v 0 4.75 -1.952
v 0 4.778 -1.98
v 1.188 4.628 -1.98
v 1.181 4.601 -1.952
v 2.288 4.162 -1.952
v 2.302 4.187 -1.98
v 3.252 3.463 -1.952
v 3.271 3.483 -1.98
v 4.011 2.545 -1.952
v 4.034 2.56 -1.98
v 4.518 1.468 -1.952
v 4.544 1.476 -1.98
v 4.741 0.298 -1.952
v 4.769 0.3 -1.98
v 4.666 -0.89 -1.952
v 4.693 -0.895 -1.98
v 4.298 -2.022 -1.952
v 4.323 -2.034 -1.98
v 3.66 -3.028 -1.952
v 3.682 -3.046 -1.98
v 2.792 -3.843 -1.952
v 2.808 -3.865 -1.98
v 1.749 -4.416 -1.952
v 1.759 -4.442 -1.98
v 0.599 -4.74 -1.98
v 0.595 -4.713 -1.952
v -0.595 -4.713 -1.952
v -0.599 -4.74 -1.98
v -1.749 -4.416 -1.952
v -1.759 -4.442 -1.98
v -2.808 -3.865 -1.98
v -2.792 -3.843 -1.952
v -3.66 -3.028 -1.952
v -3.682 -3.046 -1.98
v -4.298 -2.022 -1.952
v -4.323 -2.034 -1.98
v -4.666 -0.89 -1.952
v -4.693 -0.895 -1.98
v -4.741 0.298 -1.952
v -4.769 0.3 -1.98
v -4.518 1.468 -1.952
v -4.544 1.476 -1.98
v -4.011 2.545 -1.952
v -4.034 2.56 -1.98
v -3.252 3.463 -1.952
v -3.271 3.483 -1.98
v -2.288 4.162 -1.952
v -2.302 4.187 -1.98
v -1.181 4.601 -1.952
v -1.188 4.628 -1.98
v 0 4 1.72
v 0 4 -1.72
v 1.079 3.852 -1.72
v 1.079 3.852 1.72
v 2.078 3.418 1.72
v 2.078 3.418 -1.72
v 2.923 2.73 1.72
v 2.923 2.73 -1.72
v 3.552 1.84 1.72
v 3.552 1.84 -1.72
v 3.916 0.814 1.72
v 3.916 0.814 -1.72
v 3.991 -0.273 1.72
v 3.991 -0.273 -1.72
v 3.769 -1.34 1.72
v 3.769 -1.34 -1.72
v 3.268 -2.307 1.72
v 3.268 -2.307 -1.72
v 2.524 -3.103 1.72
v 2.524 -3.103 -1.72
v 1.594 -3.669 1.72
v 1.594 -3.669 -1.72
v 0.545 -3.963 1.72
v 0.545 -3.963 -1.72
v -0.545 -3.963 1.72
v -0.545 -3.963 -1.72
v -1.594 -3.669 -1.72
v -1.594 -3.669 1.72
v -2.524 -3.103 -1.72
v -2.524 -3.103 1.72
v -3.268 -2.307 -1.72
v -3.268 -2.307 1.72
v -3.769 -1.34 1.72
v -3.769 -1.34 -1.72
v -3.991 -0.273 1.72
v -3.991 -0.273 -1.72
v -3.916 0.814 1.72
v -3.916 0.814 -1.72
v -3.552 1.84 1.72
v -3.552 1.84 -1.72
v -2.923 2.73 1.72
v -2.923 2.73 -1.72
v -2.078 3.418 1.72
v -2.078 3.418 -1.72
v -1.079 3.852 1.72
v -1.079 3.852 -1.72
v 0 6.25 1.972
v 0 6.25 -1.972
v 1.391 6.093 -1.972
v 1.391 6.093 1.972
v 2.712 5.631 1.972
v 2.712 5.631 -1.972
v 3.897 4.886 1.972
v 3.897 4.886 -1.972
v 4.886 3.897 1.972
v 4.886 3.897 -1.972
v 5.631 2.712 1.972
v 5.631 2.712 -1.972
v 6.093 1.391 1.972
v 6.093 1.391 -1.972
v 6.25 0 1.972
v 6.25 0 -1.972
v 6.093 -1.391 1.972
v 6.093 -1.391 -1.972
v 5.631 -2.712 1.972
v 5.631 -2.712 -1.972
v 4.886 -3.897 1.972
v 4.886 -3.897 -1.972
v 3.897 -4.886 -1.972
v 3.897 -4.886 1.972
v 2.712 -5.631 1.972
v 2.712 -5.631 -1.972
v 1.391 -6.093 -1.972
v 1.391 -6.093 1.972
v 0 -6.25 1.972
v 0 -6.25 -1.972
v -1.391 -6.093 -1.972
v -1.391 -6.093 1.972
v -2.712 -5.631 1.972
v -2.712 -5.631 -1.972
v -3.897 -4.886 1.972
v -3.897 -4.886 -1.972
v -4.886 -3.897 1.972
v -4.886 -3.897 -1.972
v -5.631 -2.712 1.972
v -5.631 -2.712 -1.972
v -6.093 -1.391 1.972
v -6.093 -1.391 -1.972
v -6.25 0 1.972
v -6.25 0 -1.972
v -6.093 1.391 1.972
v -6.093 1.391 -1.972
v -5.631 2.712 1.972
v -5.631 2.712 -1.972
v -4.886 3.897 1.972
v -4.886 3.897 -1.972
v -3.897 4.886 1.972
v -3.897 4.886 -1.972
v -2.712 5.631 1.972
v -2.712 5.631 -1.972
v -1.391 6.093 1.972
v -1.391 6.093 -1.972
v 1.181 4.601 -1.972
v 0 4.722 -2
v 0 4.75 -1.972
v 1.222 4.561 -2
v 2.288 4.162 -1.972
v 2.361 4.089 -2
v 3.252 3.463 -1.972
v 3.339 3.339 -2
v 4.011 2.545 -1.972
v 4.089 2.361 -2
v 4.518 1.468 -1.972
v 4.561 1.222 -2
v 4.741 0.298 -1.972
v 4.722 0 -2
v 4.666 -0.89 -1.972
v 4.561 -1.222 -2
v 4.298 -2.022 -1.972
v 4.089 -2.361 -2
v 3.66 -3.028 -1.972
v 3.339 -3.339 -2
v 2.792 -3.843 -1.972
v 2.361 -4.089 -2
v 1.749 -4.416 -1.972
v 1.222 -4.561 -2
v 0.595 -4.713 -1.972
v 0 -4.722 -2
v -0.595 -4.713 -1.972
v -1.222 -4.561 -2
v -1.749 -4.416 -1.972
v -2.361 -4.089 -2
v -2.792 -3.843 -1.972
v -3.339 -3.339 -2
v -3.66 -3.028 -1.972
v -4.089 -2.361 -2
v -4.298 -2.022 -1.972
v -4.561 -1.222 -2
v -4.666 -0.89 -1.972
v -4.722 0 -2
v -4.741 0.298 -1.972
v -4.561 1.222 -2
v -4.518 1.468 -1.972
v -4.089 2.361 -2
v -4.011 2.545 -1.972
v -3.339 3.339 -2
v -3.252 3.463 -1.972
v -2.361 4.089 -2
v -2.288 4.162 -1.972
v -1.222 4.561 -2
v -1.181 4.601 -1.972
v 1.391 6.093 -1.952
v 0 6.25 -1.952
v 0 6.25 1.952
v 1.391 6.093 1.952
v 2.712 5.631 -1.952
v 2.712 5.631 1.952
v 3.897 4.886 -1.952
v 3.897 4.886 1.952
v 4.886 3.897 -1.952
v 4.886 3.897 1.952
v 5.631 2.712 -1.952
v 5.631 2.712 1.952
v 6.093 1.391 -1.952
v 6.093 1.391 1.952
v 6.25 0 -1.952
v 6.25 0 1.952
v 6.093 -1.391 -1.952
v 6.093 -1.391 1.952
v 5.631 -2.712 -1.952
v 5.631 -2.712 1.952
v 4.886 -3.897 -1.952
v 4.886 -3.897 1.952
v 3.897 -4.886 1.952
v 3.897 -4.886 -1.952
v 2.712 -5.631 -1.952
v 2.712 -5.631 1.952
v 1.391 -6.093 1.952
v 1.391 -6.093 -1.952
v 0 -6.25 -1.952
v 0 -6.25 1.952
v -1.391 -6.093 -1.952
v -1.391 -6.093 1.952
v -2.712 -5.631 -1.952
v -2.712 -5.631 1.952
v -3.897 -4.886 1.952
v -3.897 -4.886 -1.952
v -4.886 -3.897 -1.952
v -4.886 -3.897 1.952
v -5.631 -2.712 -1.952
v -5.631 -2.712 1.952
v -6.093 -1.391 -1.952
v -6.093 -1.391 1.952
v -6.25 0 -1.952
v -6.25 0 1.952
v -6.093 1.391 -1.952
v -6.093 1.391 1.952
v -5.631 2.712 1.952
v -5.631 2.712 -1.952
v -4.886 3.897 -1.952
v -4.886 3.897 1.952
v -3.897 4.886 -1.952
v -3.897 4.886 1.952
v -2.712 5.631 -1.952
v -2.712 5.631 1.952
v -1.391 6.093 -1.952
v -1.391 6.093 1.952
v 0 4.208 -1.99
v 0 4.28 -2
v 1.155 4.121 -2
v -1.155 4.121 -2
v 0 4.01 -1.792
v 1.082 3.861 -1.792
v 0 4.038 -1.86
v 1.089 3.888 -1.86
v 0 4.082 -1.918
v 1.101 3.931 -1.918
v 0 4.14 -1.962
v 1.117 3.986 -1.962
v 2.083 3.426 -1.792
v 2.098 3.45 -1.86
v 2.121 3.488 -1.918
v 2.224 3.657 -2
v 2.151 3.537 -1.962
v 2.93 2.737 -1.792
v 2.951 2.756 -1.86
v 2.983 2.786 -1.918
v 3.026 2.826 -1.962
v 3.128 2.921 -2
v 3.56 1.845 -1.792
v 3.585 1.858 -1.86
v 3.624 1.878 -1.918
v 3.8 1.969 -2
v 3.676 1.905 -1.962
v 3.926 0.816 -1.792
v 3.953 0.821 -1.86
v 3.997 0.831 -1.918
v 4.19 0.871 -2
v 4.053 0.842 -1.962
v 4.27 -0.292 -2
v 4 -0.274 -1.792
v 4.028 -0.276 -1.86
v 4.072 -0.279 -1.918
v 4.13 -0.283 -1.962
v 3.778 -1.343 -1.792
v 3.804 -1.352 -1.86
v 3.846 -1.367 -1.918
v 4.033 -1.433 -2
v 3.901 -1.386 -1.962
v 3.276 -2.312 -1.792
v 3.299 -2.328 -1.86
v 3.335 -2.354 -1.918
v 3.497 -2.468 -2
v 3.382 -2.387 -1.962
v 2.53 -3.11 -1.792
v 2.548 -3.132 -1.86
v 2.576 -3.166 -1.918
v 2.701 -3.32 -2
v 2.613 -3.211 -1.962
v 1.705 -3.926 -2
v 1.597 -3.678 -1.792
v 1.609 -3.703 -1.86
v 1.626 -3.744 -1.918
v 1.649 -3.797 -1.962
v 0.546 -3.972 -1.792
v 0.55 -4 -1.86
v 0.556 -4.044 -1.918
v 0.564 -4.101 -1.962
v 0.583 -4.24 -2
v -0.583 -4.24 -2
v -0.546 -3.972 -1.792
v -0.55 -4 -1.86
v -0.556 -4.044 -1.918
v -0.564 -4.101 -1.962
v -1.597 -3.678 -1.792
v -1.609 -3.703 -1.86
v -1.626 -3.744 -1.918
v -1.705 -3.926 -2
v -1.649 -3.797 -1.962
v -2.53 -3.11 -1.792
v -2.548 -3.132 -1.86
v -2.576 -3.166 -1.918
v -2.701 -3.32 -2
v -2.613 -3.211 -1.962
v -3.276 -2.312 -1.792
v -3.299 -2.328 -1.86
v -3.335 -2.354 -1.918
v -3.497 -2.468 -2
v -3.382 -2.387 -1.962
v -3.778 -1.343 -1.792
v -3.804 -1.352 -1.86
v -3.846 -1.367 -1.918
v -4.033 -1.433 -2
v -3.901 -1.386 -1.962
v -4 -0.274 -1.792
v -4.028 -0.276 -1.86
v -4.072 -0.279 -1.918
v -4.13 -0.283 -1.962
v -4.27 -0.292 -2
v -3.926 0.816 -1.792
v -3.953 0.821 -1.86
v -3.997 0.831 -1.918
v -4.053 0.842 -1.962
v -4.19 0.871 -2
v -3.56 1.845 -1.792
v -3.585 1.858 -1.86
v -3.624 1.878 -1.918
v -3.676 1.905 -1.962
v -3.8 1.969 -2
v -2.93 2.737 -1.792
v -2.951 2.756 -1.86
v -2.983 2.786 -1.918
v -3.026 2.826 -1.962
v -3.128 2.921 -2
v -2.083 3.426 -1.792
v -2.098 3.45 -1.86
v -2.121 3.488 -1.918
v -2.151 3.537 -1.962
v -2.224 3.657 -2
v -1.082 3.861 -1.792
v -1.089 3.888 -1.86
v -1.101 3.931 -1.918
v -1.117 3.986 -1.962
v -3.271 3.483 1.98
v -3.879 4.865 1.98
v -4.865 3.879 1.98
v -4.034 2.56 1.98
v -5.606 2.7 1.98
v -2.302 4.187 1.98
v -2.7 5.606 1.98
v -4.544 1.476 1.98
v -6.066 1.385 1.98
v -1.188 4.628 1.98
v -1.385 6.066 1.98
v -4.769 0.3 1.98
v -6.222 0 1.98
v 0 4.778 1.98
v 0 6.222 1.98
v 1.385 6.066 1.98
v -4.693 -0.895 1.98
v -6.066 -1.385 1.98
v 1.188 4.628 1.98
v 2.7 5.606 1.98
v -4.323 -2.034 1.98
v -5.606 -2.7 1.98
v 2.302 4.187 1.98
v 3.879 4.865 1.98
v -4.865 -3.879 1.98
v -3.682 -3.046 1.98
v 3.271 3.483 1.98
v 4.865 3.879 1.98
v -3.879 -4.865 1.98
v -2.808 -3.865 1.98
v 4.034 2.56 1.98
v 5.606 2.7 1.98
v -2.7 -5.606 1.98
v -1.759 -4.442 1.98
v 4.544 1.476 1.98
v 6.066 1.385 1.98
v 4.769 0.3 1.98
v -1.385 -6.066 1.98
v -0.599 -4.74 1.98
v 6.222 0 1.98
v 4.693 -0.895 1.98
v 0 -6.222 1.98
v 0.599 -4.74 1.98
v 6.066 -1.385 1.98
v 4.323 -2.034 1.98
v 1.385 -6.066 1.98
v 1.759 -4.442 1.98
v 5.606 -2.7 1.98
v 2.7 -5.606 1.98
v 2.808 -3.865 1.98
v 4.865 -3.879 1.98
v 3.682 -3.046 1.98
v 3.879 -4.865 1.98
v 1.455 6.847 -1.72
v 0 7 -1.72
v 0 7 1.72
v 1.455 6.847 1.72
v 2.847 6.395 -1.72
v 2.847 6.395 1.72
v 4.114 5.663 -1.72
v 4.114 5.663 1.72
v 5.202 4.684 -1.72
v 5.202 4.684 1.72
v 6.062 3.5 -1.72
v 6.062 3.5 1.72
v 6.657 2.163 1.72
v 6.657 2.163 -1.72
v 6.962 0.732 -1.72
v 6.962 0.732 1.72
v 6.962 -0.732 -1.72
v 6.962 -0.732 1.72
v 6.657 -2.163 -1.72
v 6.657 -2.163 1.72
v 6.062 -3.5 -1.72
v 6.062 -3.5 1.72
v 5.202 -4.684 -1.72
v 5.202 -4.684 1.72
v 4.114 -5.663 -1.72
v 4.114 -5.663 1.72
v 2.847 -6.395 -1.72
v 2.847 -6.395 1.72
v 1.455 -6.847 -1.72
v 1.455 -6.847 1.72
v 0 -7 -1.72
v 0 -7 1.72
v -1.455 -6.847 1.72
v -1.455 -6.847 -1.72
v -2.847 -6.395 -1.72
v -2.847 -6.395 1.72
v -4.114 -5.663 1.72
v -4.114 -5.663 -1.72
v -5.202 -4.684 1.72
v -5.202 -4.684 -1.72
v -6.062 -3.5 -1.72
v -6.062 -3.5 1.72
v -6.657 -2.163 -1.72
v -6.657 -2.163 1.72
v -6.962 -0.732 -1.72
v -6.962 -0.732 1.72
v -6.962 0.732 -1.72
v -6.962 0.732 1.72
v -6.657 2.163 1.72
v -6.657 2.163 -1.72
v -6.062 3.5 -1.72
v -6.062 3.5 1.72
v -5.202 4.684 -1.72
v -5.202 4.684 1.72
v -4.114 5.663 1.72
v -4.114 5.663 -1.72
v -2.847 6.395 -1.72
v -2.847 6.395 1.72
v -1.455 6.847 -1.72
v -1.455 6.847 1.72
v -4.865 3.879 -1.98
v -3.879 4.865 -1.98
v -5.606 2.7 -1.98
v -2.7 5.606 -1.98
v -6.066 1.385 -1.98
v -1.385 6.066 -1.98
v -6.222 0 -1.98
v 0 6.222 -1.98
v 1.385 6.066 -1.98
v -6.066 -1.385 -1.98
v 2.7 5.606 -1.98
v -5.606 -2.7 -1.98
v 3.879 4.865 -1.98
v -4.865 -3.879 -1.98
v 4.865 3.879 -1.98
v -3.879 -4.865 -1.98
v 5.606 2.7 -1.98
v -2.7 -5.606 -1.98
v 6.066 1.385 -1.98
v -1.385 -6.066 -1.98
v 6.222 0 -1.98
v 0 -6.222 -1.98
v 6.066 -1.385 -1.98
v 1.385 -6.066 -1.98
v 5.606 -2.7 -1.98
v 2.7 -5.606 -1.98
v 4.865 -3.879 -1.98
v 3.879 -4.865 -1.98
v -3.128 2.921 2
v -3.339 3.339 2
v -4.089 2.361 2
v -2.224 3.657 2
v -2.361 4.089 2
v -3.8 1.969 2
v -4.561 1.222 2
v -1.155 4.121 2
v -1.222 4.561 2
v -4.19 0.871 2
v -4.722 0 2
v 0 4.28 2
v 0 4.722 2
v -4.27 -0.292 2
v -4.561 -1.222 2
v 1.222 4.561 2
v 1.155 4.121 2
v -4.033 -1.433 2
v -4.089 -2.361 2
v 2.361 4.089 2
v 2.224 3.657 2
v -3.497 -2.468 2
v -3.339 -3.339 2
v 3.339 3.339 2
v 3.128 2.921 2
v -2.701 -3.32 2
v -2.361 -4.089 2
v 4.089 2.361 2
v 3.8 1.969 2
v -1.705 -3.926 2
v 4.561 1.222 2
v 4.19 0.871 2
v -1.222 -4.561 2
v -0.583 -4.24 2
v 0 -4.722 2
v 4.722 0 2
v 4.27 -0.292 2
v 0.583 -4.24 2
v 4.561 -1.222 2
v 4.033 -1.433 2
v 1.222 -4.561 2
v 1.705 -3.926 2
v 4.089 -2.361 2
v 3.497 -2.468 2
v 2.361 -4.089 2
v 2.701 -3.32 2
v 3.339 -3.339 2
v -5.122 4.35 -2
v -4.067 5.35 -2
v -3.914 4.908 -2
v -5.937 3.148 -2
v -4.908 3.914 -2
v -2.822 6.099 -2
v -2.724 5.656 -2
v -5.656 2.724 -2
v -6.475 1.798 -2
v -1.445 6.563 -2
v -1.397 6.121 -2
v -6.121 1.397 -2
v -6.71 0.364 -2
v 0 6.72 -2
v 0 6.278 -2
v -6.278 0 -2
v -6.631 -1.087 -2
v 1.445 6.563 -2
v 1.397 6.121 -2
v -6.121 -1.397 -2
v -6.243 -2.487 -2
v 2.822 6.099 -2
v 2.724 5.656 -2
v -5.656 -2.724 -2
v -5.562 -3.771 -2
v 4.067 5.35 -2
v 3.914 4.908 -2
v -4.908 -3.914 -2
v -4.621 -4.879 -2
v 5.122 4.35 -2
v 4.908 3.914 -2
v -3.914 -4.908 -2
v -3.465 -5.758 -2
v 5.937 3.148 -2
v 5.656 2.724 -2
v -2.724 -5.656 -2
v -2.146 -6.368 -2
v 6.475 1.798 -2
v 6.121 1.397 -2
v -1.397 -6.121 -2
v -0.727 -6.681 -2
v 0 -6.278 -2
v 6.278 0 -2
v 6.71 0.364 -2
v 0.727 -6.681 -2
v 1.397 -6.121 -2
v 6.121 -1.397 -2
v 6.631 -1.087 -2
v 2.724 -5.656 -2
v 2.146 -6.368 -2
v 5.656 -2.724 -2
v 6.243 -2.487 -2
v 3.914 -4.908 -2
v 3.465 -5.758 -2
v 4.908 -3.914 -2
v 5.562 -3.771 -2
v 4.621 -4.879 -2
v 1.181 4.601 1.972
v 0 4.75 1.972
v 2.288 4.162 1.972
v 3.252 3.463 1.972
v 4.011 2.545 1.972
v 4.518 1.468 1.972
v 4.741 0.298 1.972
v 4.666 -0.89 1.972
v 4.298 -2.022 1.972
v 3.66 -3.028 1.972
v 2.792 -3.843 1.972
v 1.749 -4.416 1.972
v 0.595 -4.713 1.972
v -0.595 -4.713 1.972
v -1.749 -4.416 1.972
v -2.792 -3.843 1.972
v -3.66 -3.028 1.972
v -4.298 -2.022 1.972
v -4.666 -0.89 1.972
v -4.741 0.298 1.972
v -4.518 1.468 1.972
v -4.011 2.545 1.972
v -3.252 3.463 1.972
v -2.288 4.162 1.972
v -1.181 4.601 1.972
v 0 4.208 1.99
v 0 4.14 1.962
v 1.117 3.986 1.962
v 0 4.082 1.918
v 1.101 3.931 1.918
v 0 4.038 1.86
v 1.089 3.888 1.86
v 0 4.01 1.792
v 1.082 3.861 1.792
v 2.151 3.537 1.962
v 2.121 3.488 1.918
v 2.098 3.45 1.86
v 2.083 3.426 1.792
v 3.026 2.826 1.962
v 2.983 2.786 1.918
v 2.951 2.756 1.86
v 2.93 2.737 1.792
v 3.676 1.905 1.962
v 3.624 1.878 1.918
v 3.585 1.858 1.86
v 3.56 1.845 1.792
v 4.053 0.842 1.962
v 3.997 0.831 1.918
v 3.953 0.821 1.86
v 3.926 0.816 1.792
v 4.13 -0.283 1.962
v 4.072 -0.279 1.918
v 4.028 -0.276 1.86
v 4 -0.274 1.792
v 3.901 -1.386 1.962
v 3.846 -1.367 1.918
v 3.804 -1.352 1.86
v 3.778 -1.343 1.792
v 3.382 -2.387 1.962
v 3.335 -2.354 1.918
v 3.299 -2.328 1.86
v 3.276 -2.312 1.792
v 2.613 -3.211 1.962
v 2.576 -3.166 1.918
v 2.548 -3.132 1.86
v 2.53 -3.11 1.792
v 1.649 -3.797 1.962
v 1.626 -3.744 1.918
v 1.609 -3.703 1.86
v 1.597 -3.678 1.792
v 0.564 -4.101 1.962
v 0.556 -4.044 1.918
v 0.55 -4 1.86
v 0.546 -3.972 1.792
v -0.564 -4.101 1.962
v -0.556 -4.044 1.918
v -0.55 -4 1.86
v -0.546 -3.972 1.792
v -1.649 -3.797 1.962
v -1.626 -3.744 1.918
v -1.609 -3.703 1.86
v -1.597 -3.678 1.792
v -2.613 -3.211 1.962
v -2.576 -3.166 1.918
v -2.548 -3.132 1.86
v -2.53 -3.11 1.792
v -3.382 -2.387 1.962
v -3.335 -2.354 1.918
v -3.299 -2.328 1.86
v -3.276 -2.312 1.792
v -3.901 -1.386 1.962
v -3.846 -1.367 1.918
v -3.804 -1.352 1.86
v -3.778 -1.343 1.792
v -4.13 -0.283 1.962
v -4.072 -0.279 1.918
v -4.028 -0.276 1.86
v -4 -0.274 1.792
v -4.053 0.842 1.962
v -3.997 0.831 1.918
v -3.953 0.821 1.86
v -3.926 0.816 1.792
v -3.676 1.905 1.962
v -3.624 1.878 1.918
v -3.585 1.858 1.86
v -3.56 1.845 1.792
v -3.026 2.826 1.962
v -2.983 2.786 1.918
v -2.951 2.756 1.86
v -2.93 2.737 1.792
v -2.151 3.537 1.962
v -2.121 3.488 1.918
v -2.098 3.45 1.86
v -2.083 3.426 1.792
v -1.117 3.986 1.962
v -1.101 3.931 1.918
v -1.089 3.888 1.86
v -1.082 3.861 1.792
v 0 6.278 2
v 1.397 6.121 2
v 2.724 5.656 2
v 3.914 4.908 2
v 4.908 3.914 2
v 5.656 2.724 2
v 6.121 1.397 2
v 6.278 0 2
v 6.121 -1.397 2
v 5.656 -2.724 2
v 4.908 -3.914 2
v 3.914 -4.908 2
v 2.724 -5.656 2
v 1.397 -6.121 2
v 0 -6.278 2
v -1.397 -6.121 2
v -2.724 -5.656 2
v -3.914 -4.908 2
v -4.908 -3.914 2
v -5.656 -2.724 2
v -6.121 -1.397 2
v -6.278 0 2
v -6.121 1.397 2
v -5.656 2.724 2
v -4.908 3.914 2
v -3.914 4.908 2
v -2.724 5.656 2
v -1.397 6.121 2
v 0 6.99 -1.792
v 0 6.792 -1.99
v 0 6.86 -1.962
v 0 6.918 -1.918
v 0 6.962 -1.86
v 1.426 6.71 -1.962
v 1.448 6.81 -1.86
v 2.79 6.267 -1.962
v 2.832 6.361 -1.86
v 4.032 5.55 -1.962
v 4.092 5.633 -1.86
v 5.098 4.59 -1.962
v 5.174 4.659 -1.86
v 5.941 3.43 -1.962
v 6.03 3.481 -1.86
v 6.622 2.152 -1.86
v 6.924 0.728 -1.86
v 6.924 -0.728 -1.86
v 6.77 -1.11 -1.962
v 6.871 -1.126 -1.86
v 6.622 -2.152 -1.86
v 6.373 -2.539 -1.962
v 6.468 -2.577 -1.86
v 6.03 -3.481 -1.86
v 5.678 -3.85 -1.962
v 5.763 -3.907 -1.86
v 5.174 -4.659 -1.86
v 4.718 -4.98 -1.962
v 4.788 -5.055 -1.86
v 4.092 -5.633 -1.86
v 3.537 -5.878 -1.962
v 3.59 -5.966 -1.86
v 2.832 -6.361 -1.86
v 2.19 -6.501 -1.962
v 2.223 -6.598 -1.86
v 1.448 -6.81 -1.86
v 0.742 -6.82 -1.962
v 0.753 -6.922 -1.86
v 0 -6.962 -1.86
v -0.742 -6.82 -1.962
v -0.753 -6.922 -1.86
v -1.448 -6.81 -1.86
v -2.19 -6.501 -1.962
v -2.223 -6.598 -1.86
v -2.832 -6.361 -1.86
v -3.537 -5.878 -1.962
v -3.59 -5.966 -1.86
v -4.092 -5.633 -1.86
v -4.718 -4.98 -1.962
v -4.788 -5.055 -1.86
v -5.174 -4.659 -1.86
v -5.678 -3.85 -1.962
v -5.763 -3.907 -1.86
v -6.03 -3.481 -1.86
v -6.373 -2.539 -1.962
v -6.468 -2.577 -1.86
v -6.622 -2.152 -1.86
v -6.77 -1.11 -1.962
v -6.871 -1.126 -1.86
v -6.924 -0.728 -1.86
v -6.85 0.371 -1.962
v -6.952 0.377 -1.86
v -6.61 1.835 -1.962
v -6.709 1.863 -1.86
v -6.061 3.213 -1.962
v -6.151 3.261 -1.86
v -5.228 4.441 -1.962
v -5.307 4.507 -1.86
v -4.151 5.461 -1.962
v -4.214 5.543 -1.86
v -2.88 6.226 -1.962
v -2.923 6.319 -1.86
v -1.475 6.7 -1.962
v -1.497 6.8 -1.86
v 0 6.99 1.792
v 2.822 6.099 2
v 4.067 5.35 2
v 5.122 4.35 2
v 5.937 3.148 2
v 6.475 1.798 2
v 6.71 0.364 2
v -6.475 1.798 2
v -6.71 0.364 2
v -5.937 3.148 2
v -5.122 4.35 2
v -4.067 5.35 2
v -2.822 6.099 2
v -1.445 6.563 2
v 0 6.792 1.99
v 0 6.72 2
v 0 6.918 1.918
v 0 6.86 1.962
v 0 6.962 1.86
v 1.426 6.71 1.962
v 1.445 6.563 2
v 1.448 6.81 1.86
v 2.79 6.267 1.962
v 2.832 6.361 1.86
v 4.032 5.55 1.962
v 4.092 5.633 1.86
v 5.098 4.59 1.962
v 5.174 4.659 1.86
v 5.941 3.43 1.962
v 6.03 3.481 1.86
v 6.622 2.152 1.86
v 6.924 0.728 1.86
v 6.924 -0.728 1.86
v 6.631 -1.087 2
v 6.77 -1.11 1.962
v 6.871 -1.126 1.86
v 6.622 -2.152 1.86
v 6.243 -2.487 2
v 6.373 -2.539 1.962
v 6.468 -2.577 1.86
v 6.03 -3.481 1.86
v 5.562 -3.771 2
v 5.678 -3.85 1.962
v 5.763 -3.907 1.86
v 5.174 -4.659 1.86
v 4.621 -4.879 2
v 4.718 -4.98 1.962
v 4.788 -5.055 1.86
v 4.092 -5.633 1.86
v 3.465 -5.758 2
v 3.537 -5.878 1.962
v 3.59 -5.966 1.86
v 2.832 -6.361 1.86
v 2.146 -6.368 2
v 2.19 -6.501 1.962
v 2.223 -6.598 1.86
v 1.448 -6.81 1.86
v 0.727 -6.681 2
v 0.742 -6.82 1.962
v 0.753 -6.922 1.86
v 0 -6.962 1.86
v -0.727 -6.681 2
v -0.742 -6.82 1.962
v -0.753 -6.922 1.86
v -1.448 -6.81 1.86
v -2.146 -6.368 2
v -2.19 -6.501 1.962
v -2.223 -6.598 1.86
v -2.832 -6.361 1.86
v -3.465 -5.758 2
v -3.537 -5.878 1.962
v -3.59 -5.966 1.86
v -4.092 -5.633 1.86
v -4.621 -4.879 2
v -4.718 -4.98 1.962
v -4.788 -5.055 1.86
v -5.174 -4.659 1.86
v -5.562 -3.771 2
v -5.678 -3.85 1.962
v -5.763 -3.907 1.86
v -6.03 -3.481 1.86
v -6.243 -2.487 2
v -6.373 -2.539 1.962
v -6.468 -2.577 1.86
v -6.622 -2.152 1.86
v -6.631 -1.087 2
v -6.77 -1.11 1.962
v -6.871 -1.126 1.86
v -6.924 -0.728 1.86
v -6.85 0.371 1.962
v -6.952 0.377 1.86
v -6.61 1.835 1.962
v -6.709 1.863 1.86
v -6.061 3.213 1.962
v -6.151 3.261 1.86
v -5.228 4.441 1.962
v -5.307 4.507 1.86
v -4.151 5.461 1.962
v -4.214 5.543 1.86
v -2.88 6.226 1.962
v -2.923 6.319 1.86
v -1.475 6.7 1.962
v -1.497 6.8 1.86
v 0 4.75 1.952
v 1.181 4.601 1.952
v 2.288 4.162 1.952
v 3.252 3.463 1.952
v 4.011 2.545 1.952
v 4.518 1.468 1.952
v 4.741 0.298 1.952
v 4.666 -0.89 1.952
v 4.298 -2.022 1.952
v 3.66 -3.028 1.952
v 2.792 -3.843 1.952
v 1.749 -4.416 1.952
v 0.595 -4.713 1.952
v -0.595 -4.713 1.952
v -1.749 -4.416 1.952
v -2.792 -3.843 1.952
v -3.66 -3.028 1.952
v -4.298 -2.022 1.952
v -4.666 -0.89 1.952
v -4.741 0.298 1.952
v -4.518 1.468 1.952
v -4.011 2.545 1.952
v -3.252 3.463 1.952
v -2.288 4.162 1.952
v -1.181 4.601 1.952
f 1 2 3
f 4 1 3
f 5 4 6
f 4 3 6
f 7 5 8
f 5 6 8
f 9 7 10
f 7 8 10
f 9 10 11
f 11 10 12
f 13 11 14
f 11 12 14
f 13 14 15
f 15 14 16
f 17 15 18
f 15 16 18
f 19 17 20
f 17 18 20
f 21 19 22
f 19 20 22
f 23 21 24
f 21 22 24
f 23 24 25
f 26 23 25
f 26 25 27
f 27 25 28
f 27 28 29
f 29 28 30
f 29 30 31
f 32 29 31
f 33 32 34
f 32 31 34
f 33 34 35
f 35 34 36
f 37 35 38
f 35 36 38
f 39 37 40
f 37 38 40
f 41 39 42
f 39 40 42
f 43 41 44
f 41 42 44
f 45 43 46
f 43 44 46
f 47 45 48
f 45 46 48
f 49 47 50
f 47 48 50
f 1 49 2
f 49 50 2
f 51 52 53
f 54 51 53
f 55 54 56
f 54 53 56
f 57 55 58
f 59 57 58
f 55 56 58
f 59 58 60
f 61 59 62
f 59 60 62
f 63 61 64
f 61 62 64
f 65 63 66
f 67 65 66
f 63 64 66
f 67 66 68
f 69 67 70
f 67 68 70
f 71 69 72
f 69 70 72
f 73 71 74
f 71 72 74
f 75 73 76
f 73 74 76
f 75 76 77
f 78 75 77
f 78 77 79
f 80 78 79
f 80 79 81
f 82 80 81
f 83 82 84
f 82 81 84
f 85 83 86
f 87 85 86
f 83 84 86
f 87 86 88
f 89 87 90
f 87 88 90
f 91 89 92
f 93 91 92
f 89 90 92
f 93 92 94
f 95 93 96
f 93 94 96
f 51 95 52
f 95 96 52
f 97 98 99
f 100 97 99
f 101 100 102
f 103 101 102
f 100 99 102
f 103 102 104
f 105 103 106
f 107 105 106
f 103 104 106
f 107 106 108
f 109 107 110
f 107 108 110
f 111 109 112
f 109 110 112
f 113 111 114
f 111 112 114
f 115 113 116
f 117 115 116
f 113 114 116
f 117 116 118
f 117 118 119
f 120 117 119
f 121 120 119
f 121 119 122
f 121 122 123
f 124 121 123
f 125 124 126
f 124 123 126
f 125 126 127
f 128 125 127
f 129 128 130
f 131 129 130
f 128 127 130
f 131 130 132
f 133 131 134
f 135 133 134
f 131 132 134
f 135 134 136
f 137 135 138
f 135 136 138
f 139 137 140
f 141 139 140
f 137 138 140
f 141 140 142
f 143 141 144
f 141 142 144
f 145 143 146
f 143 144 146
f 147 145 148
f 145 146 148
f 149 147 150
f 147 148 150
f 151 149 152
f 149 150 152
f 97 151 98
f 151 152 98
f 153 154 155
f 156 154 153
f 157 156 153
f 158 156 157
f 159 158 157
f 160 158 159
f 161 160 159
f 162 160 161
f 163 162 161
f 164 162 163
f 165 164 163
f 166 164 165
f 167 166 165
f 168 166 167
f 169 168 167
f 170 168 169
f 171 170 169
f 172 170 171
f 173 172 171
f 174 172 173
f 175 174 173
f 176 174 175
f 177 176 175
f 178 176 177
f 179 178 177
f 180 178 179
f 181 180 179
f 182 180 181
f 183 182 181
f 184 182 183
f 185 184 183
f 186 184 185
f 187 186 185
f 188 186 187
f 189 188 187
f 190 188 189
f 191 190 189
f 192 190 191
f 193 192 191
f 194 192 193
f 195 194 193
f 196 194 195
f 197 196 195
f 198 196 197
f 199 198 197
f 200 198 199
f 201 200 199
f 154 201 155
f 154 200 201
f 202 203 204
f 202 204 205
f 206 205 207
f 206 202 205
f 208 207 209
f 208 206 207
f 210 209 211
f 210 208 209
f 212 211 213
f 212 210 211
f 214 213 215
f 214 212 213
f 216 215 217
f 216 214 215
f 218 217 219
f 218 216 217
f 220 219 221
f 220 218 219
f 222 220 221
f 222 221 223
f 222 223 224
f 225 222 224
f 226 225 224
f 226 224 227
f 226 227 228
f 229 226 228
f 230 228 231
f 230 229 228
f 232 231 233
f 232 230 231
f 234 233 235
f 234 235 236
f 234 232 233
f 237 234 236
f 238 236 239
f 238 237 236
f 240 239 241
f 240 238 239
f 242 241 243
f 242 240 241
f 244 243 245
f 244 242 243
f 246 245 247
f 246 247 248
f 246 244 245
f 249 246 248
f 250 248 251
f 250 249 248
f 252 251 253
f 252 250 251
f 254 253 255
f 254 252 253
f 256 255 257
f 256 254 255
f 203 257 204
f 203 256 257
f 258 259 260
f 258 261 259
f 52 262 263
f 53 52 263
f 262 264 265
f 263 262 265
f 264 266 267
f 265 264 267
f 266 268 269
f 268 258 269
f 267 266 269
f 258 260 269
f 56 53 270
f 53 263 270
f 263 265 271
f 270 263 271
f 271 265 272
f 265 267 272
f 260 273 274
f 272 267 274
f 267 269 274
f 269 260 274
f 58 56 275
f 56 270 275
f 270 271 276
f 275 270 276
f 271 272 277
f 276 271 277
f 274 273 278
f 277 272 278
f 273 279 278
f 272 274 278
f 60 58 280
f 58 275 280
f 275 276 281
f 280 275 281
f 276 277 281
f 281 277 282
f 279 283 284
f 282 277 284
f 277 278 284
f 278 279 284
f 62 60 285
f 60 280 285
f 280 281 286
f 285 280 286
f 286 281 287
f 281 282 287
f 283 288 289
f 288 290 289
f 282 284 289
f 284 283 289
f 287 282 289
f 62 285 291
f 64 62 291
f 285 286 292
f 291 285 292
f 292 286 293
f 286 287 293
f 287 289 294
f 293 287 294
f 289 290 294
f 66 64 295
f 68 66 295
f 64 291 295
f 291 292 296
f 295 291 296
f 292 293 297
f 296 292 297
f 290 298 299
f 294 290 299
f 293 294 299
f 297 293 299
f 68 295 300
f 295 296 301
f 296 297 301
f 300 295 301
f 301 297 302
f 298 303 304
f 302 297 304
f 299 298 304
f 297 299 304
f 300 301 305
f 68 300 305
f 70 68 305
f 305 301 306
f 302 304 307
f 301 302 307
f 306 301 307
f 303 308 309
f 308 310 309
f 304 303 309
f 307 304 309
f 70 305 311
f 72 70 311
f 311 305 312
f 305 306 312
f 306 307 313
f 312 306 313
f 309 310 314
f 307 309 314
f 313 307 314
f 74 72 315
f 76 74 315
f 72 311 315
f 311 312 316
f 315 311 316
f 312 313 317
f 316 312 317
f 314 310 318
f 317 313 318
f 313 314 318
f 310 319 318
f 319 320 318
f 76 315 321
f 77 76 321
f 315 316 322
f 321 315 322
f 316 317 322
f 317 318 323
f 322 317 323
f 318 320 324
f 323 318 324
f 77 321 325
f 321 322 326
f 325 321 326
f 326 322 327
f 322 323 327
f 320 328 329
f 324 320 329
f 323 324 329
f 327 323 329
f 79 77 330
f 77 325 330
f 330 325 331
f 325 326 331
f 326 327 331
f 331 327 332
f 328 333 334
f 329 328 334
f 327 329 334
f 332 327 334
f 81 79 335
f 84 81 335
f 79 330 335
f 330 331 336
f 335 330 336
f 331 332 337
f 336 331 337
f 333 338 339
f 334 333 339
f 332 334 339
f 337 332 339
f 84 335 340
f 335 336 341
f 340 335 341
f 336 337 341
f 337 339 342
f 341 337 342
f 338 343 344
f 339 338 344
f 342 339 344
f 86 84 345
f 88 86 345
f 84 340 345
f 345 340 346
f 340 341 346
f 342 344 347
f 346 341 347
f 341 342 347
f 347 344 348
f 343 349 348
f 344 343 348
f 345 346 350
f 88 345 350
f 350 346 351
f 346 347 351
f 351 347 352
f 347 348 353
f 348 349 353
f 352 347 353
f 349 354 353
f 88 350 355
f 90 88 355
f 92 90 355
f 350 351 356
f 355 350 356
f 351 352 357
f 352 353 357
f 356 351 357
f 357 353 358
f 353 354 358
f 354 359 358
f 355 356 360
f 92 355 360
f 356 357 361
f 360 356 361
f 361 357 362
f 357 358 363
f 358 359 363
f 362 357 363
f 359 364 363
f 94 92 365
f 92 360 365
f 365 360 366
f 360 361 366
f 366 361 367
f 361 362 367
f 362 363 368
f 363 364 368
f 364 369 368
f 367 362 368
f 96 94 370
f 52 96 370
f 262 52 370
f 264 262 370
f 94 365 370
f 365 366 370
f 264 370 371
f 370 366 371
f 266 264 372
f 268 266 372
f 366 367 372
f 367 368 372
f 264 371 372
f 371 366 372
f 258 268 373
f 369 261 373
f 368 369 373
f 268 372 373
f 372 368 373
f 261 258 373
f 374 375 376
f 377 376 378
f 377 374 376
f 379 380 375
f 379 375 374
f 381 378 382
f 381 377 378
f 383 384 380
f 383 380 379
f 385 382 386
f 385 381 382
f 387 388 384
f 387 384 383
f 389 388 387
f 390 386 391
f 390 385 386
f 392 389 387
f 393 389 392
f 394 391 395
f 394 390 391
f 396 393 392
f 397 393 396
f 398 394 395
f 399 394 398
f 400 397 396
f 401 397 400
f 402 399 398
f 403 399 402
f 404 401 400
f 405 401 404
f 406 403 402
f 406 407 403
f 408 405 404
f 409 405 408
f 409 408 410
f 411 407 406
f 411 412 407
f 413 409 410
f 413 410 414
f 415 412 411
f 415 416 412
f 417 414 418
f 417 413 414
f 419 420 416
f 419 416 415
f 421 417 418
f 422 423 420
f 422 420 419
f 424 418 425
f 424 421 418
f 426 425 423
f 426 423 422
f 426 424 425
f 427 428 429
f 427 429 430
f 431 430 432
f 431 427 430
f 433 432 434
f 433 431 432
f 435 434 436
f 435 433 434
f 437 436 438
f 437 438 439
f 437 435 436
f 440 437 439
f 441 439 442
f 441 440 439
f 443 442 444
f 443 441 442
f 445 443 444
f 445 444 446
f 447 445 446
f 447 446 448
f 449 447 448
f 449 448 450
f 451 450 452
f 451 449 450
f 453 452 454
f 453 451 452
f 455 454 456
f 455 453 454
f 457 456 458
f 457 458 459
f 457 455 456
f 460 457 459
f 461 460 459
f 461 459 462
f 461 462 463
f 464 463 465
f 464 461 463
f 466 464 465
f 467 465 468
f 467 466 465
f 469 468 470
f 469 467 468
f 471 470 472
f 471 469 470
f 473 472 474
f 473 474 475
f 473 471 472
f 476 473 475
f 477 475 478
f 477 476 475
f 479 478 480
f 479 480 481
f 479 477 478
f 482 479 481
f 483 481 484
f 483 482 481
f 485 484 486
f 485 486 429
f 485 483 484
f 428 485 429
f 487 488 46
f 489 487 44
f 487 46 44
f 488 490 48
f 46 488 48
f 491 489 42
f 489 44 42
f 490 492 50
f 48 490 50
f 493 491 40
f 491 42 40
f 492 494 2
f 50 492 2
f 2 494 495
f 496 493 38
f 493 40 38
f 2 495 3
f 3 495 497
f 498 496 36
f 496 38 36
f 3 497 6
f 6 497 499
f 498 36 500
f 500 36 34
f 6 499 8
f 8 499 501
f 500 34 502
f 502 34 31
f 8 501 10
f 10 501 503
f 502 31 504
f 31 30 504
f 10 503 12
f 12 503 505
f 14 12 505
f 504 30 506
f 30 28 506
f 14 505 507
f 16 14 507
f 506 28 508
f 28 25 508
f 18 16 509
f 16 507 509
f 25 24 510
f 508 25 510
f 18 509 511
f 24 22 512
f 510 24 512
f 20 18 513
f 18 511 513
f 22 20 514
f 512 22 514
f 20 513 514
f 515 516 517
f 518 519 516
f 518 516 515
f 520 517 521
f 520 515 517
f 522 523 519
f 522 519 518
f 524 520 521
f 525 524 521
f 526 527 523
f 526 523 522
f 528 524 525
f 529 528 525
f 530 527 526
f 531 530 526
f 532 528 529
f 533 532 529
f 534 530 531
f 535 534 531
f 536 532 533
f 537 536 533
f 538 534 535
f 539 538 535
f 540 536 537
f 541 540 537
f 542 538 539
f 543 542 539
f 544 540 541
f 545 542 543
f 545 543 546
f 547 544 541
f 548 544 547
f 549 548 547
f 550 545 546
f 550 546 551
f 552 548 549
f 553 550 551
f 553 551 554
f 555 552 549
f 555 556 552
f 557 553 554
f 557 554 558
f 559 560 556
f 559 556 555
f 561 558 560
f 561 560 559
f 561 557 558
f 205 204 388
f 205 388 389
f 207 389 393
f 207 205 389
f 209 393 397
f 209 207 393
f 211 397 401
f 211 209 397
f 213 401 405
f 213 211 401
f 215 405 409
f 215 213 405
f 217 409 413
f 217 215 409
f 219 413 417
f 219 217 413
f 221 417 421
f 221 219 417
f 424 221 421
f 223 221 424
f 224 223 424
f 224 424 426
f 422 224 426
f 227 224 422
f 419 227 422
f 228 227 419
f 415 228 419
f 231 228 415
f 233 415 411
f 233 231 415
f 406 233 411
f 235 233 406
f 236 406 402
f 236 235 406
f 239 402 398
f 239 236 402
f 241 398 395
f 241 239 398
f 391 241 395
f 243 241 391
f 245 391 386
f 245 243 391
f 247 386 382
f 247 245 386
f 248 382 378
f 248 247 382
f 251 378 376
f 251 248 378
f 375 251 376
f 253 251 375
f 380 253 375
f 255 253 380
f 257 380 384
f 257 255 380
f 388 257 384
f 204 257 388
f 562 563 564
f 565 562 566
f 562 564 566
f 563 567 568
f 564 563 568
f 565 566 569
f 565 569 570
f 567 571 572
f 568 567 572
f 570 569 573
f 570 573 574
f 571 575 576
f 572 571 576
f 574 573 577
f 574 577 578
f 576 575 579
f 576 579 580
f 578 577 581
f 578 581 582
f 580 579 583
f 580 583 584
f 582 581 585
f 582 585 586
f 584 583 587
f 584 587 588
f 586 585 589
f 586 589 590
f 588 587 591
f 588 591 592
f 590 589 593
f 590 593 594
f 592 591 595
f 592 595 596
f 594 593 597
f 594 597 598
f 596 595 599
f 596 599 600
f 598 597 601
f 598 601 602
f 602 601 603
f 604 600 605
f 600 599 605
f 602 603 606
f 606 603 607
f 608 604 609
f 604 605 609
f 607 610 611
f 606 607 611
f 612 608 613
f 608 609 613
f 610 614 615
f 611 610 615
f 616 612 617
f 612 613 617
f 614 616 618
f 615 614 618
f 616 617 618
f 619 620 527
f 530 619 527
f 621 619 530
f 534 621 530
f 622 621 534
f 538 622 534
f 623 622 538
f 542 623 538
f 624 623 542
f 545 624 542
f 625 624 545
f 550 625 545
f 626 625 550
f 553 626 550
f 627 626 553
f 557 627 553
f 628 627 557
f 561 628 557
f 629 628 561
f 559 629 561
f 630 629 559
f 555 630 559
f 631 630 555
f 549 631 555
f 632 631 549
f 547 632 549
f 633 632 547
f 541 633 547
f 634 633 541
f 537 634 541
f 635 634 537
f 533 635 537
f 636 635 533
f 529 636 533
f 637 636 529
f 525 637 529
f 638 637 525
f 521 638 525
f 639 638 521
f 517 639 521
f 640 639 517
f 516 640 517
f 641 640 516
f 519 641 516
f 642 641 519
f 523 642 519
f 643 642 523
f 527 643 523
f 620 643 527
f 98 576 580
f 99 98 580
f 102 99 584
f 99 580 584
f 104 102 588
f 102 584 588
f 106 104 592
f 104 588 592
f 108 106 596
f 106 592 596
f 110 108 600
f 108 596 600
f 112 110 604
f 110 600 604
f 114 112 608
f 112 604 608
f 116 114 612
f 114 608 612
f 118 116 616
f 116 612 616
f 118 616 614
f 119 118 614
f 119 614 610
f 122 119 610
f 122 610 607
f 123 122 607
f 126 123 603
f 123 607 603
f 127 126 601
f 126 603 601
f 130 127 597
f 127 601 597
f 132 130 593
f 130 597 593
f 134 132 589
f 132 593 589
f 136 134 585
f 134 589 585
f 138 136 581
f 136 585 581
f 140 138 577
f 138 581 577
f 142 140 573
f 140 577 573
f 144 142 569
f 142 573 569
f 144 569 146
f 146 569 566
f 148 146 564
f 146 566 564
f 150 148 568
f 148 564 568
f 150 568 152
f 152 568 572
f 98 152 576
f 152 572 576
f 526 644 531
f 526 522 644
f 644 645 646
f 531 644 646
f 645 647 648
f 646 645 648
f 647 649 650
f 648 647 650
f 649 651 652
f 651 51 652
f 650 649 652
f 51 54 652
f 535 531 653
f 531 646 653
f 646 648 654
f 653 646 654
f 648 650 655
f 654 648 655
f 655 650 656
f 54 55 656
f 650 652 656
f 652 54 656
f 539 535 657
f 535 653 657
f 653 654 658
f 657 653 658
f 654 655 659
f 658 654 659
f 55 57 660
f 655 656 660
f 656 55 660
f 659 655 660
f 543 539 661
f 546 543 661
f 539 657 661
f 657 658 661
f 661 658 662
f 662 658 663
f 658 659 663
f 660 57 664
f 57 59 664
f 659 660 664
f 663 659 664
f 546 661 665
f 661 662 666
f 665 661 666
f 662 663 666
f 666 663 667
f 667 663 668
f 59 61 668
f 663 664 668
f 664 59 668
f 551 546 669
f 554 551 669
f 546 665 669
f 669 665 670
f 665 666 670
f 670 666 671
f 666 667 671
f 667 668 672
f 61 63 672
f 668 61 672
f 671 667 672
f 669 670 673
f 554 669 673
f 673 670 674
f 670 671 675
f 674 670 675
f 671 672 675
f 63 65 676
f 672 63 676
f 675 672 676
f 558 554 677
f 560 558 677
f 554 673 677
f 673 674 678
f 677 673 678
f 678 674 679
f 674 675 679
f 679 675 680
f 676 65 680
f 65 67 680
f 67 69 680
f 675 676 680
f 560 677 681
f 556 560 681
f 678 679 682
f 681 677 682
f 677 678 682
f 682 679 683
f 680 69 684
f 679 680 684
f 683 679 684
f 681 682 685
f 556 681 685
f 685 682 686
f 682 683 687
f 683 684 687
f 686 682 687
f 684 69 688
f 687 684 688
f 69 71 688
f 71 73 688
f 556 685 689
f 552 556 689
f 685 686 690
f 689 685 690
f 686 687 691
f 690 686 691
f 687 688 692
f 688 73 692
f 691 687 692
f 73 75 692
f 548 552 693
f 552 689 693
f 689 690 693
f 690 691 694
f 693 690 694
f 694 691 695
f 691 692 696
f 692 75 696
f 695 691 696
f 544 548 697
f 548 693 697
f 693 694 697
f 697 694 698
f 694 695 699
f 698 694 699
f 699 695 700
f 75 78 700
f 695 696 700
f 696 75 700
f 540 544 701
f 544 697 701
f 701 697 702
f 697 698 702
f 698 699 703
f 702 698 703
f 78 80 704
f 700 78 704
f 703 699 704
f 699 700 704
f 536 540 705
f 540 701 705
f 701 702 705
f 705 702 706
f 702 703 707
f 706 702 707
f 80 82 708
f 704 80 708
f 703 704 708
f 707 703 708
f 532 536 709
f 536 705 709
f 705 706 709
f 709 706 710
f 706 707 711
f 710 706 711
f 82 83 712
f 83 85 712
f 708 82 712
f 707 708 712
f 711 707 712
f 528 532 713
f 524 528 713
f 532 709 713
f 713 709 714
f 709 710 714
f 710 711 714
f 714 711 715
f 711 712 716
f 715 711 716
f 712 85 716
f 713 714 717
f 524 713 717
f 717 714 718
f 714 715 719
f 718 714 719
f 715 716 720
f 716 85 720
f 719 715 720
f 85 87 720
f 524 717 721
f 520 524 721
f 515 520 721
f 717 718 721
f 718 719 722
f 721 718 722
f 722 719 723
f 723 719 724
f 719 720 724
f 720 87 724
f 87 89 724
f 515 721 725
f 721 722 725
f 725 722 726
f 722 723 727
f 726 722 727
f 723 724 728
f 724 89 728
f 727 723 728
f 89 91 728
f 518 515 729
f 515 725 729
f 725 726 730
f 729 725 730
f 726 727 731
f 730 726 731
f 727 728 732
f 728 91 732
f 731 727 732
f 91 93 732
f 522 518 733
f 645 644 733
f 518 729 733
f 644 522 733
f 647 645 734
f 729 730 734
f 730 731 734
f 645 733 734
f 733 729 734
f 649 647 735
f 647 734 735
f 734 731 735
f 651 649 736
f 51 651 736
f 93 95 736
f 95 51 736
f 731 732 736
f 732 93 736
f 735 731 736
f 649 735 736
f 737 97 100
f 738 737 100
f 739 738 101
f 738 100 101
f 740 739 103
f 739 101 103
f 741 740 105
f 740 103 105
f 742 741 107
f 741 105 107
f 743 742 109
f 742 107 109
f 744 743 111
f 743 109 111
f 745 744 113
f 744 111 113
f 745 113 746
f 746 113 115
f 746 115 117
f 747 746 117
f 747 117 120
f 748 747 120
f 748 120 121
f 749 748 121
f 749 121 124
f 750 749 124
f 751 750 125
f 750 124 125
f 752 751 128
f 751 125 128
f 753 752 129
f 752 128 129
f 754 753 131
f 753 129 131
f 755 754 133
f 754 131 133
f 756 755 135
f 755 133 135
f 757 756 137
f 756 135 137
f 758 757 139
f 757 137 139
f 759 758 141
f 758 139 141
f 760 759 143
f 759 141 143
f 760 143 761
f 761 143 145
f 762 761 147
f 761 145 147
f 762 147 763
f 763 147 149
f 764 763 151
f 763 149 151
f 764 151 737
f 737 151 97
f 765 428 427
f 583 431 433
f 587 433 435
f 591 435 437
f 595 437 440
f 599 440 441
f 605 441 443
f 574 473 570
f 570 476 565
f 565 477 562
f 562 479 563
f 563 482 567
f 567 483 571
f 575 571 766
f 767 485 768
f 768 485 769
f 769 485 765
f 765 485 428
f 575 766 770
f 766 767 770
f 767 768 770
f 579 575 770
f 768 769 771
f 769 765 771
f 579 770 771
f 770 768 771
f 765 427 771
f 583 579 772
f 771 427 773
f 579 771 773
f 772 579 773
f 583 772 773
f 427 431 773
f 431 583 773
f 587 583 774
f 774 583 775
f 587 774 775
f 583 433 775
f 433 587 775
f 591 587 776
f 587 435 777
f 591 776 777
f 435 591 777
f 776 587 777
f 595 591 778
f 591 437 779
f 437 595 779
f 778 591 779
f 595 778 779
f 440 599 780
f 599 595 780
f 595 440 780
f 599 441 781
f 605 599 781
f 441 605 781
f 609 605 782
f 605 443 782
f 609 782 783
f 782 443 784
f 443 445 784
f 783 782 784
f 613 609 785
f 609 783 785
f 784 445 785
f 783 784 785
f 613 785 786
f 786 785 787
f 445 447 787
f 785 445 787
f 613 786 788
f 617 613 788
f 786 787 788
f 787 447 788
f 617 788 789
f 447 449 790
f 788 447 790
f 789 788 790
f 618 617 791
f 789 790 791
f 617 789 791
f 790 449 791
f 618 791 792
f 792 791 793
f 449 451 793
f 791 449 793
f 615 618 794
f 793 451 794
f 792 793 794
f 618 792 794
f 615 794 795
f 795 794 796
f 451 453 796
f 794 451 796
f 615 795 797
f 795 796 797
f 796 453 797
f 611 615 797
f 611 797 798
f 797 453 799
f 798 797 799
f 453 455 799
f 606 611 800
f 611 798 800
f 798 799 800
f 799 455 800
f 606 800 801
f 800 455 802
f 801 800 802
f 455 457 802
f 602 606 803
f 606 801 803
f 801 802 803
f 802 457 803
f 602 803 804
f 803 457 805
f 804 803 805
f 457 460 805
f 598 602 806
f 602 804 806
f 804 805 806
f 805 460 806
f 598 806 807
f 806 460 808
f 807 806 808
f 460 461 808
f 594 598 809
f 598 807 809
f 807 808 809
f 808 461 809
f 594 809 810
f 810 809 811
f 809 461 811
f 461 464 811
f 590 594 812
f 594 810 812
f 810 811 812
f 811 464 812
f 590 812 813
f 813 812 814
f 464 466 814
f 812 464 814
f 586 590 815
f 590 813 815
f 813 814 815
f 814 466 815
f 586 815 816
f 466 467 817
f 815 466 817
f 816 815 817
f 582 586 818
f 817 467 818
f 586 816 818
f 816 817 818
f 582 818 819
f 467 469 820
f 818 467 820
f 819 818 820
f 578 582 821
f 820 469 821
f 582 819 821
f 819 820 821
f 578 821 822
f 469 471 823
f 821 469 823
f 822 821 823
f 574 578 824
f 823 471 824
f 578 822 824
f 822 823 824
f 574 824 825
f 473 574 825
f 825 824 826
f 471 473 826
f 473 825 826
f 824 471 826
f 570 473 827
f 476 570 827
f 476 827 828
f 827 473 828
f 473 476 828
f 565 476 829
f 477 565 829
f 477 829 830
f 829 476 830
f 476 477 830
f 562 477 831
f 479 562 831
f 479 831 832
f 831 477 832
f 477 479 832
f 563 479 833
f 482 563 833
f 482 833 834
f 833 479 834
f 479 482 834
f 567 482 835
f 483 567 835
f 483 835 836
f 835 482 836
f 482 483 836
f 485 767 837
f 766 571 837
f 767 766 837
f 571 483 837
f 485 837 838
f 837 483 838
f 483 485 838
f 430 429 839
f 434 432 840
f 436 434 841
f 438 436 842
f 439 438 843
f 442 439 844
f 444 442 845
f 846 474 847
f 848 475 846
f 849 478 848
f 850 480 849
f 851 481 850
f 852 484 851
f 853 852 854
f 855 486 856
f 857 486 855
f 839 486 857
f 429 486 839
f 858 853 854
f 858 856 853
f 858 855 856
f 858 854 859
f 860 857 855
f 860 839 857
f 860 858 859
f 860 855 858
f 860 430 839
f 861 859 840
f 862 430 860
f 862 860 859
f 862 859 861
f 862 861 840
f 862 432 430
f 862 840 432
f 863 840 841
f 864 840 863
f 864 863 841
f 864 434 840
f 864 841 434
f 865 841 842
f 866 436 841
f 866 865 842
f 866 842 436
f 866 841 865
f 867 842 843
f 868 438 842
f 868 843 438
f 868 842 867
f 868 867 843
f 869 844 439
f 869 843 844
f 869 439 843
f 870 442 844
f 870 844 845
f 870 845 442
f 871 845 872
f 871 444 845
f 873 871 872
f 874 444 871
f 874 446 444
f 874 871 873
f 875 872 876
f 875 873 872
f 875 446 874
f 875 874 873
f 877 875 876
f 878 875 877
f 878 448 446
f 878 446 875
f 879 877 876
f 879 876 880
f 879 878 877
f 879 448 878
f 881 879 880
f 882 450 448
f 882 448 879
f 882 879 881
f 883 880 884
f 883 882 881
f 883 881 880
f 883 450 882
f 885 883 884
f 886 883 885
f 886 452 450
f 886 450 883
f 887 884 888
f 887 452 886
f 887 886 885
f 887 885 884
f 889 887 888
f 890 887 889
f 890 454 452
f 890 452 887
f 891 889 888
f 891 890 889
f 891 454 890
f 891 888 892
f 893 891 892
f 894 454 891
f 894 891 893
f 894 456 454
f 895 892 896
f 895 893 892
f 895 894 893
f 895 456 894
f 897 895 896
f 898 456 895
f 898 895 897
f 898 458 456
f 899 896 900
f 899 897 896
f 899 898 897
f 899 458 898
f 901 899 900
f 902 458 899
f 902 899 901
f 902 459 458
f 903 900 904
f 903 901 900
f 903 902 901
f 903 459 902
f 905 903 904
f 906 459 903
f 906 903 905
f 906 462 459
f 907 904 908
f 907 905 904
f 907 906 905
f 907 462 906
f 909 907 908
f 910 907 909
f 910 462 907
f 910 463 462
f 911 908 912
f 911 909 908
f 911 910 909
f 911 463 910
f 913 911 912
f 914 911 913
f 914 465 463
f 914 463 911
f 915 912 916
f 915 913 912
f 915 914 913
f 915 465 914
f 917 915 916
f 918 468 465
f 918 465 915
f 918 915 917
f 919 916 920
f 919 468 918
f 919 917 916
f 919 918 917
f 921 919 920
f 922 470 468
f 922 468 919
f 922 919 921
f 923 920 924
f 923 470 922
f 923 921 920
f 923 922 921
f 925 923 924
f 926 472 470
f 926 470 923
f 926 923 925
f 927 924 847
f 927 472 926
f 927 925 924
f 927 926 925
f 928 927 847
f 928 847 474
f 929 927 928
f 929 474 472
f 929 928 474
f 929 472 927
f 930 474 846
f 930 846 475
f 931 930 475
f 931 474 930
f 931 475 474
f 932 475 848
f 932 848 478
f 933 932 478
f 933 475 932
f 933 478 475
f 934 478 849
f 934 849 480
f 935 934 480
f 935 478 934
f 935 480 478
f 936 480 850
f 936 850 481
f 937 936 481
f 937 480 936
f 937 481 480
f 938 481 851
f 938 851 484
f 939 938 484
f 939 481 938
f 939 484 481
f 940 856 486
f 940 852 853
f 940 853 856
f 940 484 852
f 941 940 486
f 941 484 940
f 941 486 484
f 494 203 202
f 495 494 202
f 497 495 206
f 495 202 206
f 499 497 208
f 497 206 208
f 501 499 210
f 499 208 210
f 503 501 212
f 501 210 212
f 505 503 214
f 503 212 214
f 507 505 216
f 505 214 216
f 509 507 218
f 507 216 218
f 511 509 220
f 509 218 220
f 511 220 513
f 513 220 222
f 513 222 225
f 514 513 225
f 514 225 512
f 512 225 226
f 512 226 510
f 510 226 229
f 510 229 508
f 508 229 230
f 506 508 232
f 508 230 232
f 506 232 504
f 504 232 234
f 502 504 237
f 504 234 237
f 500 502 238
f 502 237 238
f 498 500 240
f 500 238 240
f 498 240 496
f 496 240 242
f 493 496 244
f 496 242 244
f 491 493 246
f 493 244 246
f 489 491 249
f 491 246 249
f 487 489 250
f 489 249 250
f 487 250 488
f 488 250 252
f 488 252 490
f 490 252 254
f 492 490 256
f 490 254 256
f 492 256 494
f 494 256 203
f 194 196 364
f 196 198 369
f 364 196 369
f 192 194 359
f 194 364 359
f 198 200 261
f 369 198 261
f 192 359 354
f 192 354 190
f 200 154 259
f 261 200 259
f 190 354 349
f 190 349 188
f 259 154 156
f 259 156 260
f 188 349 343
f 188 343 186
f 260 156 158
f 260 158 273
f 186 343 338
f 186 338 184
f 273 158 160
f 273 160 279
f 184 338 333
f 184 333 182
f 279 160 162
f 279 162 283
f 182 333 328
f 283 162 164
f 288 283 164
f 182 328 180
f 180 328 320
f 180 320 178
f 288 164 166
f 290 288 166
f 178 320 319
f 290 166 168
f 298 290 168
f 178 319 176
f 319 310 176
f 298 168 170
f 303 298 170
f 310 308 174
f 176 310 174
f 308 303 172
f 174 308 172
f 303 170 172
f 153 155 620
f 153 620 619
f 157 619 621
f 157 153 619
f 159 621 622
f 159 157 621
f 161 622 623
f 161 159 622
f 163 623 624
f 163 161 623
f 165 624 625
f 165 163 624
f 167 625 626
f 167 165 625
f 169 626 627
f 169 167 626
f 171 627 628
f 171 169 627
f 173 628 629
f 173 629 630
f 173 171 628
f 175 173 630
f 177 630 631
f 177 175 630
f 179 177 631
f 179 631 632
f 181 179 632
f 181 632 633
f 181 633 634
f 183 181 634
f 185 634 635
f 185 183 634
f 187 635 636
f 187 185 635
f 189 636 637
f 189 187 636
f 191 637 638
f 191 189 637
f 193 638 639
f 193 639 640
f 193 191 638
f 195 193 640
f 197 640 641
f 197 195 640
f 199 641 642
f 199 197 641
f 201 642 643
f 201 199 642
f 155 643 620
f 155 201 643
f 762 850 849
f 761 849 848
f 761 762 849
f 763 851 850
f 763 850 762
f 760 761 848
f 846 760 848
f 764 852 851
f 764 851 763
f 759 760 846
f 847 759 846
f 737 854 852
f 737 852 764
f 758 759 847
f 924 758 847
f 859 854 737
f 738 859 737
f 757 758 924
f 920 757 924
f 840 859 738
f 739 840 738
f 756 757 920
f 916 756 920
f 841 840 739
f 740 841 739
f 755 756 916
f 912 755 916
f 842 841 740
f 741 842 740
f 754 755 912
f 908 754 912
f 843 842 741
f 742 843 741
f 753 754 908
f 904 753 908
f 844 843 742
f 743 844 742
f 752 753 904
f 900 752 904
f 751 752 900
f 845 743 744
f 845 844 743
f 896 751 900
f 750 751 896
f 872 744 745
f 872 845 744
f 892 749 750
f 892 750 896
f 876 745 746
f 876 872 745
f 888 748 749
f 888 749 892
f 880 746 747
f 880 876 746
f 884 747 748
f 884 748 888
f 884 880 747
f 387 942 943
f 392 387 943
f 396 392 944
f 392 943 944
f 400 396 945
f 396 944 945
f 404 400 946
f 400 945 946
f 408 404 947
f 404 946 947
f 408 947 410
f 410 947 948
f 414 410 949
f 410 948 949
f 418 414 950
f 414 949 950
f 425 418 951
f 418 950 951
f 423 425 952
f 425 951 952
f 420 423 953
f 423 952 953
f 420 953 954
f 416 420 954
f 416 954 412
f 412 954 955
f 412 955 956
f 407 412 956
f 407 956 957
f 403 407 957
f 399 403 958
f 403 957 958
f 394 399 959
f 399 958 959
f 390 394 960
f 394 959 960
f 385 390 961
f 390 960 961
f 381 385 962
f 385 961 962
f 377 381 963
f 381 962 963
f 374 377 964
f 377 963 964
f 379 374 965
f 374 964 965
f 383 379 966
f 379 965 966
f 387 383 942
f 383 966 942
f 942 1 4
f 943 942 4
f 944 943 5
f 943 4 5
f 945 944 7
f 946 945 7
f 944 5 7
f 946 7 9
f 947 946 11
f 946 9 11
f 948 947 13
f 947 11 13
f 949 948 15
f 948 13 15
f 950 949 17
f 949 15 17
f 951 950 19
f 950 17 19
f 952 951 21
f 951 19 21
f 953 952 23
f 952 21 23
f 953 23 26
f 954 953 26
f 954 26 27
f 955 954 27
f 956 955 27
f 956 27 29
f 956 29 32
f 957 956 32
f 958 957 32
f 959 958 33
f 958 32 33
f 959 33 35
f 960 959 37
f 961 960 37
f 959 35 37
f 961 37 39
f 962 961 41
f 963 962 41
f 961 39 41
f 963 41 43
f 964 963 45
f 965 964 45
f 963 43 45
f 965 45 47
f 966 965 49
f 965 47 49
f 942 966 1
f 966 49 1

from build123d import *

# Parameters (mm, degrees)
SKETCH_R_INNER_BODY_W   = 4
SKETCH_R_INNER_BODY_H   = 0.75
FILLET_INNER_BODY_R     = 0.28
CHAMFER_INNER_BODY_SIZE = 0.028
SKETCH_R_OUTER_BODY_W   = 4
SKETCH_R_OUTER_BODY_H   = 0.75
FILLET_OUTER_BODY_R     = 0.28
CHAMFER_OUTER_BODY_SIZE = 0.028
SKETCH_R_SEAL_FACES_W   = 3.96
SKETCH_R_SEAL_FACES_H   = 1.5
CHAMFER_SEALS_SIZE      = 0.028


with BuildPart() as part:
    # Sketch R, INNER BODY → Revolve INNER BODY (revolve)
    with BuildSketch(Plane(origin=(0, 0, 0), x_dir=(0, 0, -1), z_dir=(1, 0, 0))):
        with Locations((0, 4.375)):
            Rectangle(SKETCH_R_INNER_BODY_W, SKETCH_R_INNER_BODY_H)
    revolve(axis=Axis((0, 0, 17.5), (0, 0, -1)))

    # Fillet INNER BODY
    fillet_inner_body_edges = [part.edges().sort_by_distance(p)[0] for p in [
        (0, -4, -2),
        (0, -4, 2),
    ]]
    fillet(fillet_inner_body_edges, radius=FILLET_INNER_BODY_R)

    # Chamfer INNER BODY
    chamfer_inner_body_edges = [part.edges().sort_by_distance(p)[0] for p in [
        (0, -4.75, 2),
        (0, -4.75, -2),
    ]]
    chamfer(chamfer_inner_body_edges, length=CHAMFER_INNER_BODY_SIZE)


with BuildPart() as body_2:
    # Sketch R, OUTER BODY → Revolve OUTER BODY (revolve)
    with BuildSketch(Plane(origin=(0, 0, 0), x_dir=(0, 0, -1), z_dir=(1, 0, 0))):
        with Locations((0, 6.625)):
            Rectangle(SKETCH_R_OUTER_BODY_W, SKETCH_R_OUTER_BODY_H)
    revolve(axis=Axis((0, 0, 17.5), (0, 0, -1)))

    # Fillet OUTER BODY
    fillet_outer_body_edges = [body_2.edges().sort_by_distance(p)[0] for p in [
        (0, -7, 2),
        (0, -7, -2),
    ]]
    fillet(fillet_outer_body_edges, radius=FILLET_OUTER_BODY_R)

    # Chamfer OUTER BODY
    chamfer_outer_body_edges = [body_2.edges().sort_by_distance(p)[0] for p in [
        (0, -6.25, -2),
        (0, -6.25, 2),
    ]]
    chamfer(chamfer_outer_body_edges, length=CHAMFER_OUTER_BODY_SIZE)


with BuildPart() as body_3:
    # Sketch R, SEAL FACES → Revolve SEALS (revolve)
    with BuildSketch(Plane(origin=(0, 0, 0), x_dir=(0, 0, -1), z_dir=(1, 0, 0))):
        with Locations((0, 5.5)):
            Rectangle(SKETCH_R_SEAL_FACES_W, SKETCH_R_SEAL_FACES_H)
    revolve(axis=Axis((0, 0, 17.5), (0, 0, -1)))

    # Chamfer SEALS
    chamfer_seals_edges = [body_3.edges().sort_by_distance(p)[0] for p in [
        (0, -4.75, -1.98),
        (0, -4.75, 1.98),
        (0, -6.25, 1.98),
        (0, -6.25, -1.98),
    ]]
    chamfer(chamfer_seals_edges, length=CHAMFER_SEALS_SIZE)


solid = Compound([part.part, body_2.part, body_3.part])
